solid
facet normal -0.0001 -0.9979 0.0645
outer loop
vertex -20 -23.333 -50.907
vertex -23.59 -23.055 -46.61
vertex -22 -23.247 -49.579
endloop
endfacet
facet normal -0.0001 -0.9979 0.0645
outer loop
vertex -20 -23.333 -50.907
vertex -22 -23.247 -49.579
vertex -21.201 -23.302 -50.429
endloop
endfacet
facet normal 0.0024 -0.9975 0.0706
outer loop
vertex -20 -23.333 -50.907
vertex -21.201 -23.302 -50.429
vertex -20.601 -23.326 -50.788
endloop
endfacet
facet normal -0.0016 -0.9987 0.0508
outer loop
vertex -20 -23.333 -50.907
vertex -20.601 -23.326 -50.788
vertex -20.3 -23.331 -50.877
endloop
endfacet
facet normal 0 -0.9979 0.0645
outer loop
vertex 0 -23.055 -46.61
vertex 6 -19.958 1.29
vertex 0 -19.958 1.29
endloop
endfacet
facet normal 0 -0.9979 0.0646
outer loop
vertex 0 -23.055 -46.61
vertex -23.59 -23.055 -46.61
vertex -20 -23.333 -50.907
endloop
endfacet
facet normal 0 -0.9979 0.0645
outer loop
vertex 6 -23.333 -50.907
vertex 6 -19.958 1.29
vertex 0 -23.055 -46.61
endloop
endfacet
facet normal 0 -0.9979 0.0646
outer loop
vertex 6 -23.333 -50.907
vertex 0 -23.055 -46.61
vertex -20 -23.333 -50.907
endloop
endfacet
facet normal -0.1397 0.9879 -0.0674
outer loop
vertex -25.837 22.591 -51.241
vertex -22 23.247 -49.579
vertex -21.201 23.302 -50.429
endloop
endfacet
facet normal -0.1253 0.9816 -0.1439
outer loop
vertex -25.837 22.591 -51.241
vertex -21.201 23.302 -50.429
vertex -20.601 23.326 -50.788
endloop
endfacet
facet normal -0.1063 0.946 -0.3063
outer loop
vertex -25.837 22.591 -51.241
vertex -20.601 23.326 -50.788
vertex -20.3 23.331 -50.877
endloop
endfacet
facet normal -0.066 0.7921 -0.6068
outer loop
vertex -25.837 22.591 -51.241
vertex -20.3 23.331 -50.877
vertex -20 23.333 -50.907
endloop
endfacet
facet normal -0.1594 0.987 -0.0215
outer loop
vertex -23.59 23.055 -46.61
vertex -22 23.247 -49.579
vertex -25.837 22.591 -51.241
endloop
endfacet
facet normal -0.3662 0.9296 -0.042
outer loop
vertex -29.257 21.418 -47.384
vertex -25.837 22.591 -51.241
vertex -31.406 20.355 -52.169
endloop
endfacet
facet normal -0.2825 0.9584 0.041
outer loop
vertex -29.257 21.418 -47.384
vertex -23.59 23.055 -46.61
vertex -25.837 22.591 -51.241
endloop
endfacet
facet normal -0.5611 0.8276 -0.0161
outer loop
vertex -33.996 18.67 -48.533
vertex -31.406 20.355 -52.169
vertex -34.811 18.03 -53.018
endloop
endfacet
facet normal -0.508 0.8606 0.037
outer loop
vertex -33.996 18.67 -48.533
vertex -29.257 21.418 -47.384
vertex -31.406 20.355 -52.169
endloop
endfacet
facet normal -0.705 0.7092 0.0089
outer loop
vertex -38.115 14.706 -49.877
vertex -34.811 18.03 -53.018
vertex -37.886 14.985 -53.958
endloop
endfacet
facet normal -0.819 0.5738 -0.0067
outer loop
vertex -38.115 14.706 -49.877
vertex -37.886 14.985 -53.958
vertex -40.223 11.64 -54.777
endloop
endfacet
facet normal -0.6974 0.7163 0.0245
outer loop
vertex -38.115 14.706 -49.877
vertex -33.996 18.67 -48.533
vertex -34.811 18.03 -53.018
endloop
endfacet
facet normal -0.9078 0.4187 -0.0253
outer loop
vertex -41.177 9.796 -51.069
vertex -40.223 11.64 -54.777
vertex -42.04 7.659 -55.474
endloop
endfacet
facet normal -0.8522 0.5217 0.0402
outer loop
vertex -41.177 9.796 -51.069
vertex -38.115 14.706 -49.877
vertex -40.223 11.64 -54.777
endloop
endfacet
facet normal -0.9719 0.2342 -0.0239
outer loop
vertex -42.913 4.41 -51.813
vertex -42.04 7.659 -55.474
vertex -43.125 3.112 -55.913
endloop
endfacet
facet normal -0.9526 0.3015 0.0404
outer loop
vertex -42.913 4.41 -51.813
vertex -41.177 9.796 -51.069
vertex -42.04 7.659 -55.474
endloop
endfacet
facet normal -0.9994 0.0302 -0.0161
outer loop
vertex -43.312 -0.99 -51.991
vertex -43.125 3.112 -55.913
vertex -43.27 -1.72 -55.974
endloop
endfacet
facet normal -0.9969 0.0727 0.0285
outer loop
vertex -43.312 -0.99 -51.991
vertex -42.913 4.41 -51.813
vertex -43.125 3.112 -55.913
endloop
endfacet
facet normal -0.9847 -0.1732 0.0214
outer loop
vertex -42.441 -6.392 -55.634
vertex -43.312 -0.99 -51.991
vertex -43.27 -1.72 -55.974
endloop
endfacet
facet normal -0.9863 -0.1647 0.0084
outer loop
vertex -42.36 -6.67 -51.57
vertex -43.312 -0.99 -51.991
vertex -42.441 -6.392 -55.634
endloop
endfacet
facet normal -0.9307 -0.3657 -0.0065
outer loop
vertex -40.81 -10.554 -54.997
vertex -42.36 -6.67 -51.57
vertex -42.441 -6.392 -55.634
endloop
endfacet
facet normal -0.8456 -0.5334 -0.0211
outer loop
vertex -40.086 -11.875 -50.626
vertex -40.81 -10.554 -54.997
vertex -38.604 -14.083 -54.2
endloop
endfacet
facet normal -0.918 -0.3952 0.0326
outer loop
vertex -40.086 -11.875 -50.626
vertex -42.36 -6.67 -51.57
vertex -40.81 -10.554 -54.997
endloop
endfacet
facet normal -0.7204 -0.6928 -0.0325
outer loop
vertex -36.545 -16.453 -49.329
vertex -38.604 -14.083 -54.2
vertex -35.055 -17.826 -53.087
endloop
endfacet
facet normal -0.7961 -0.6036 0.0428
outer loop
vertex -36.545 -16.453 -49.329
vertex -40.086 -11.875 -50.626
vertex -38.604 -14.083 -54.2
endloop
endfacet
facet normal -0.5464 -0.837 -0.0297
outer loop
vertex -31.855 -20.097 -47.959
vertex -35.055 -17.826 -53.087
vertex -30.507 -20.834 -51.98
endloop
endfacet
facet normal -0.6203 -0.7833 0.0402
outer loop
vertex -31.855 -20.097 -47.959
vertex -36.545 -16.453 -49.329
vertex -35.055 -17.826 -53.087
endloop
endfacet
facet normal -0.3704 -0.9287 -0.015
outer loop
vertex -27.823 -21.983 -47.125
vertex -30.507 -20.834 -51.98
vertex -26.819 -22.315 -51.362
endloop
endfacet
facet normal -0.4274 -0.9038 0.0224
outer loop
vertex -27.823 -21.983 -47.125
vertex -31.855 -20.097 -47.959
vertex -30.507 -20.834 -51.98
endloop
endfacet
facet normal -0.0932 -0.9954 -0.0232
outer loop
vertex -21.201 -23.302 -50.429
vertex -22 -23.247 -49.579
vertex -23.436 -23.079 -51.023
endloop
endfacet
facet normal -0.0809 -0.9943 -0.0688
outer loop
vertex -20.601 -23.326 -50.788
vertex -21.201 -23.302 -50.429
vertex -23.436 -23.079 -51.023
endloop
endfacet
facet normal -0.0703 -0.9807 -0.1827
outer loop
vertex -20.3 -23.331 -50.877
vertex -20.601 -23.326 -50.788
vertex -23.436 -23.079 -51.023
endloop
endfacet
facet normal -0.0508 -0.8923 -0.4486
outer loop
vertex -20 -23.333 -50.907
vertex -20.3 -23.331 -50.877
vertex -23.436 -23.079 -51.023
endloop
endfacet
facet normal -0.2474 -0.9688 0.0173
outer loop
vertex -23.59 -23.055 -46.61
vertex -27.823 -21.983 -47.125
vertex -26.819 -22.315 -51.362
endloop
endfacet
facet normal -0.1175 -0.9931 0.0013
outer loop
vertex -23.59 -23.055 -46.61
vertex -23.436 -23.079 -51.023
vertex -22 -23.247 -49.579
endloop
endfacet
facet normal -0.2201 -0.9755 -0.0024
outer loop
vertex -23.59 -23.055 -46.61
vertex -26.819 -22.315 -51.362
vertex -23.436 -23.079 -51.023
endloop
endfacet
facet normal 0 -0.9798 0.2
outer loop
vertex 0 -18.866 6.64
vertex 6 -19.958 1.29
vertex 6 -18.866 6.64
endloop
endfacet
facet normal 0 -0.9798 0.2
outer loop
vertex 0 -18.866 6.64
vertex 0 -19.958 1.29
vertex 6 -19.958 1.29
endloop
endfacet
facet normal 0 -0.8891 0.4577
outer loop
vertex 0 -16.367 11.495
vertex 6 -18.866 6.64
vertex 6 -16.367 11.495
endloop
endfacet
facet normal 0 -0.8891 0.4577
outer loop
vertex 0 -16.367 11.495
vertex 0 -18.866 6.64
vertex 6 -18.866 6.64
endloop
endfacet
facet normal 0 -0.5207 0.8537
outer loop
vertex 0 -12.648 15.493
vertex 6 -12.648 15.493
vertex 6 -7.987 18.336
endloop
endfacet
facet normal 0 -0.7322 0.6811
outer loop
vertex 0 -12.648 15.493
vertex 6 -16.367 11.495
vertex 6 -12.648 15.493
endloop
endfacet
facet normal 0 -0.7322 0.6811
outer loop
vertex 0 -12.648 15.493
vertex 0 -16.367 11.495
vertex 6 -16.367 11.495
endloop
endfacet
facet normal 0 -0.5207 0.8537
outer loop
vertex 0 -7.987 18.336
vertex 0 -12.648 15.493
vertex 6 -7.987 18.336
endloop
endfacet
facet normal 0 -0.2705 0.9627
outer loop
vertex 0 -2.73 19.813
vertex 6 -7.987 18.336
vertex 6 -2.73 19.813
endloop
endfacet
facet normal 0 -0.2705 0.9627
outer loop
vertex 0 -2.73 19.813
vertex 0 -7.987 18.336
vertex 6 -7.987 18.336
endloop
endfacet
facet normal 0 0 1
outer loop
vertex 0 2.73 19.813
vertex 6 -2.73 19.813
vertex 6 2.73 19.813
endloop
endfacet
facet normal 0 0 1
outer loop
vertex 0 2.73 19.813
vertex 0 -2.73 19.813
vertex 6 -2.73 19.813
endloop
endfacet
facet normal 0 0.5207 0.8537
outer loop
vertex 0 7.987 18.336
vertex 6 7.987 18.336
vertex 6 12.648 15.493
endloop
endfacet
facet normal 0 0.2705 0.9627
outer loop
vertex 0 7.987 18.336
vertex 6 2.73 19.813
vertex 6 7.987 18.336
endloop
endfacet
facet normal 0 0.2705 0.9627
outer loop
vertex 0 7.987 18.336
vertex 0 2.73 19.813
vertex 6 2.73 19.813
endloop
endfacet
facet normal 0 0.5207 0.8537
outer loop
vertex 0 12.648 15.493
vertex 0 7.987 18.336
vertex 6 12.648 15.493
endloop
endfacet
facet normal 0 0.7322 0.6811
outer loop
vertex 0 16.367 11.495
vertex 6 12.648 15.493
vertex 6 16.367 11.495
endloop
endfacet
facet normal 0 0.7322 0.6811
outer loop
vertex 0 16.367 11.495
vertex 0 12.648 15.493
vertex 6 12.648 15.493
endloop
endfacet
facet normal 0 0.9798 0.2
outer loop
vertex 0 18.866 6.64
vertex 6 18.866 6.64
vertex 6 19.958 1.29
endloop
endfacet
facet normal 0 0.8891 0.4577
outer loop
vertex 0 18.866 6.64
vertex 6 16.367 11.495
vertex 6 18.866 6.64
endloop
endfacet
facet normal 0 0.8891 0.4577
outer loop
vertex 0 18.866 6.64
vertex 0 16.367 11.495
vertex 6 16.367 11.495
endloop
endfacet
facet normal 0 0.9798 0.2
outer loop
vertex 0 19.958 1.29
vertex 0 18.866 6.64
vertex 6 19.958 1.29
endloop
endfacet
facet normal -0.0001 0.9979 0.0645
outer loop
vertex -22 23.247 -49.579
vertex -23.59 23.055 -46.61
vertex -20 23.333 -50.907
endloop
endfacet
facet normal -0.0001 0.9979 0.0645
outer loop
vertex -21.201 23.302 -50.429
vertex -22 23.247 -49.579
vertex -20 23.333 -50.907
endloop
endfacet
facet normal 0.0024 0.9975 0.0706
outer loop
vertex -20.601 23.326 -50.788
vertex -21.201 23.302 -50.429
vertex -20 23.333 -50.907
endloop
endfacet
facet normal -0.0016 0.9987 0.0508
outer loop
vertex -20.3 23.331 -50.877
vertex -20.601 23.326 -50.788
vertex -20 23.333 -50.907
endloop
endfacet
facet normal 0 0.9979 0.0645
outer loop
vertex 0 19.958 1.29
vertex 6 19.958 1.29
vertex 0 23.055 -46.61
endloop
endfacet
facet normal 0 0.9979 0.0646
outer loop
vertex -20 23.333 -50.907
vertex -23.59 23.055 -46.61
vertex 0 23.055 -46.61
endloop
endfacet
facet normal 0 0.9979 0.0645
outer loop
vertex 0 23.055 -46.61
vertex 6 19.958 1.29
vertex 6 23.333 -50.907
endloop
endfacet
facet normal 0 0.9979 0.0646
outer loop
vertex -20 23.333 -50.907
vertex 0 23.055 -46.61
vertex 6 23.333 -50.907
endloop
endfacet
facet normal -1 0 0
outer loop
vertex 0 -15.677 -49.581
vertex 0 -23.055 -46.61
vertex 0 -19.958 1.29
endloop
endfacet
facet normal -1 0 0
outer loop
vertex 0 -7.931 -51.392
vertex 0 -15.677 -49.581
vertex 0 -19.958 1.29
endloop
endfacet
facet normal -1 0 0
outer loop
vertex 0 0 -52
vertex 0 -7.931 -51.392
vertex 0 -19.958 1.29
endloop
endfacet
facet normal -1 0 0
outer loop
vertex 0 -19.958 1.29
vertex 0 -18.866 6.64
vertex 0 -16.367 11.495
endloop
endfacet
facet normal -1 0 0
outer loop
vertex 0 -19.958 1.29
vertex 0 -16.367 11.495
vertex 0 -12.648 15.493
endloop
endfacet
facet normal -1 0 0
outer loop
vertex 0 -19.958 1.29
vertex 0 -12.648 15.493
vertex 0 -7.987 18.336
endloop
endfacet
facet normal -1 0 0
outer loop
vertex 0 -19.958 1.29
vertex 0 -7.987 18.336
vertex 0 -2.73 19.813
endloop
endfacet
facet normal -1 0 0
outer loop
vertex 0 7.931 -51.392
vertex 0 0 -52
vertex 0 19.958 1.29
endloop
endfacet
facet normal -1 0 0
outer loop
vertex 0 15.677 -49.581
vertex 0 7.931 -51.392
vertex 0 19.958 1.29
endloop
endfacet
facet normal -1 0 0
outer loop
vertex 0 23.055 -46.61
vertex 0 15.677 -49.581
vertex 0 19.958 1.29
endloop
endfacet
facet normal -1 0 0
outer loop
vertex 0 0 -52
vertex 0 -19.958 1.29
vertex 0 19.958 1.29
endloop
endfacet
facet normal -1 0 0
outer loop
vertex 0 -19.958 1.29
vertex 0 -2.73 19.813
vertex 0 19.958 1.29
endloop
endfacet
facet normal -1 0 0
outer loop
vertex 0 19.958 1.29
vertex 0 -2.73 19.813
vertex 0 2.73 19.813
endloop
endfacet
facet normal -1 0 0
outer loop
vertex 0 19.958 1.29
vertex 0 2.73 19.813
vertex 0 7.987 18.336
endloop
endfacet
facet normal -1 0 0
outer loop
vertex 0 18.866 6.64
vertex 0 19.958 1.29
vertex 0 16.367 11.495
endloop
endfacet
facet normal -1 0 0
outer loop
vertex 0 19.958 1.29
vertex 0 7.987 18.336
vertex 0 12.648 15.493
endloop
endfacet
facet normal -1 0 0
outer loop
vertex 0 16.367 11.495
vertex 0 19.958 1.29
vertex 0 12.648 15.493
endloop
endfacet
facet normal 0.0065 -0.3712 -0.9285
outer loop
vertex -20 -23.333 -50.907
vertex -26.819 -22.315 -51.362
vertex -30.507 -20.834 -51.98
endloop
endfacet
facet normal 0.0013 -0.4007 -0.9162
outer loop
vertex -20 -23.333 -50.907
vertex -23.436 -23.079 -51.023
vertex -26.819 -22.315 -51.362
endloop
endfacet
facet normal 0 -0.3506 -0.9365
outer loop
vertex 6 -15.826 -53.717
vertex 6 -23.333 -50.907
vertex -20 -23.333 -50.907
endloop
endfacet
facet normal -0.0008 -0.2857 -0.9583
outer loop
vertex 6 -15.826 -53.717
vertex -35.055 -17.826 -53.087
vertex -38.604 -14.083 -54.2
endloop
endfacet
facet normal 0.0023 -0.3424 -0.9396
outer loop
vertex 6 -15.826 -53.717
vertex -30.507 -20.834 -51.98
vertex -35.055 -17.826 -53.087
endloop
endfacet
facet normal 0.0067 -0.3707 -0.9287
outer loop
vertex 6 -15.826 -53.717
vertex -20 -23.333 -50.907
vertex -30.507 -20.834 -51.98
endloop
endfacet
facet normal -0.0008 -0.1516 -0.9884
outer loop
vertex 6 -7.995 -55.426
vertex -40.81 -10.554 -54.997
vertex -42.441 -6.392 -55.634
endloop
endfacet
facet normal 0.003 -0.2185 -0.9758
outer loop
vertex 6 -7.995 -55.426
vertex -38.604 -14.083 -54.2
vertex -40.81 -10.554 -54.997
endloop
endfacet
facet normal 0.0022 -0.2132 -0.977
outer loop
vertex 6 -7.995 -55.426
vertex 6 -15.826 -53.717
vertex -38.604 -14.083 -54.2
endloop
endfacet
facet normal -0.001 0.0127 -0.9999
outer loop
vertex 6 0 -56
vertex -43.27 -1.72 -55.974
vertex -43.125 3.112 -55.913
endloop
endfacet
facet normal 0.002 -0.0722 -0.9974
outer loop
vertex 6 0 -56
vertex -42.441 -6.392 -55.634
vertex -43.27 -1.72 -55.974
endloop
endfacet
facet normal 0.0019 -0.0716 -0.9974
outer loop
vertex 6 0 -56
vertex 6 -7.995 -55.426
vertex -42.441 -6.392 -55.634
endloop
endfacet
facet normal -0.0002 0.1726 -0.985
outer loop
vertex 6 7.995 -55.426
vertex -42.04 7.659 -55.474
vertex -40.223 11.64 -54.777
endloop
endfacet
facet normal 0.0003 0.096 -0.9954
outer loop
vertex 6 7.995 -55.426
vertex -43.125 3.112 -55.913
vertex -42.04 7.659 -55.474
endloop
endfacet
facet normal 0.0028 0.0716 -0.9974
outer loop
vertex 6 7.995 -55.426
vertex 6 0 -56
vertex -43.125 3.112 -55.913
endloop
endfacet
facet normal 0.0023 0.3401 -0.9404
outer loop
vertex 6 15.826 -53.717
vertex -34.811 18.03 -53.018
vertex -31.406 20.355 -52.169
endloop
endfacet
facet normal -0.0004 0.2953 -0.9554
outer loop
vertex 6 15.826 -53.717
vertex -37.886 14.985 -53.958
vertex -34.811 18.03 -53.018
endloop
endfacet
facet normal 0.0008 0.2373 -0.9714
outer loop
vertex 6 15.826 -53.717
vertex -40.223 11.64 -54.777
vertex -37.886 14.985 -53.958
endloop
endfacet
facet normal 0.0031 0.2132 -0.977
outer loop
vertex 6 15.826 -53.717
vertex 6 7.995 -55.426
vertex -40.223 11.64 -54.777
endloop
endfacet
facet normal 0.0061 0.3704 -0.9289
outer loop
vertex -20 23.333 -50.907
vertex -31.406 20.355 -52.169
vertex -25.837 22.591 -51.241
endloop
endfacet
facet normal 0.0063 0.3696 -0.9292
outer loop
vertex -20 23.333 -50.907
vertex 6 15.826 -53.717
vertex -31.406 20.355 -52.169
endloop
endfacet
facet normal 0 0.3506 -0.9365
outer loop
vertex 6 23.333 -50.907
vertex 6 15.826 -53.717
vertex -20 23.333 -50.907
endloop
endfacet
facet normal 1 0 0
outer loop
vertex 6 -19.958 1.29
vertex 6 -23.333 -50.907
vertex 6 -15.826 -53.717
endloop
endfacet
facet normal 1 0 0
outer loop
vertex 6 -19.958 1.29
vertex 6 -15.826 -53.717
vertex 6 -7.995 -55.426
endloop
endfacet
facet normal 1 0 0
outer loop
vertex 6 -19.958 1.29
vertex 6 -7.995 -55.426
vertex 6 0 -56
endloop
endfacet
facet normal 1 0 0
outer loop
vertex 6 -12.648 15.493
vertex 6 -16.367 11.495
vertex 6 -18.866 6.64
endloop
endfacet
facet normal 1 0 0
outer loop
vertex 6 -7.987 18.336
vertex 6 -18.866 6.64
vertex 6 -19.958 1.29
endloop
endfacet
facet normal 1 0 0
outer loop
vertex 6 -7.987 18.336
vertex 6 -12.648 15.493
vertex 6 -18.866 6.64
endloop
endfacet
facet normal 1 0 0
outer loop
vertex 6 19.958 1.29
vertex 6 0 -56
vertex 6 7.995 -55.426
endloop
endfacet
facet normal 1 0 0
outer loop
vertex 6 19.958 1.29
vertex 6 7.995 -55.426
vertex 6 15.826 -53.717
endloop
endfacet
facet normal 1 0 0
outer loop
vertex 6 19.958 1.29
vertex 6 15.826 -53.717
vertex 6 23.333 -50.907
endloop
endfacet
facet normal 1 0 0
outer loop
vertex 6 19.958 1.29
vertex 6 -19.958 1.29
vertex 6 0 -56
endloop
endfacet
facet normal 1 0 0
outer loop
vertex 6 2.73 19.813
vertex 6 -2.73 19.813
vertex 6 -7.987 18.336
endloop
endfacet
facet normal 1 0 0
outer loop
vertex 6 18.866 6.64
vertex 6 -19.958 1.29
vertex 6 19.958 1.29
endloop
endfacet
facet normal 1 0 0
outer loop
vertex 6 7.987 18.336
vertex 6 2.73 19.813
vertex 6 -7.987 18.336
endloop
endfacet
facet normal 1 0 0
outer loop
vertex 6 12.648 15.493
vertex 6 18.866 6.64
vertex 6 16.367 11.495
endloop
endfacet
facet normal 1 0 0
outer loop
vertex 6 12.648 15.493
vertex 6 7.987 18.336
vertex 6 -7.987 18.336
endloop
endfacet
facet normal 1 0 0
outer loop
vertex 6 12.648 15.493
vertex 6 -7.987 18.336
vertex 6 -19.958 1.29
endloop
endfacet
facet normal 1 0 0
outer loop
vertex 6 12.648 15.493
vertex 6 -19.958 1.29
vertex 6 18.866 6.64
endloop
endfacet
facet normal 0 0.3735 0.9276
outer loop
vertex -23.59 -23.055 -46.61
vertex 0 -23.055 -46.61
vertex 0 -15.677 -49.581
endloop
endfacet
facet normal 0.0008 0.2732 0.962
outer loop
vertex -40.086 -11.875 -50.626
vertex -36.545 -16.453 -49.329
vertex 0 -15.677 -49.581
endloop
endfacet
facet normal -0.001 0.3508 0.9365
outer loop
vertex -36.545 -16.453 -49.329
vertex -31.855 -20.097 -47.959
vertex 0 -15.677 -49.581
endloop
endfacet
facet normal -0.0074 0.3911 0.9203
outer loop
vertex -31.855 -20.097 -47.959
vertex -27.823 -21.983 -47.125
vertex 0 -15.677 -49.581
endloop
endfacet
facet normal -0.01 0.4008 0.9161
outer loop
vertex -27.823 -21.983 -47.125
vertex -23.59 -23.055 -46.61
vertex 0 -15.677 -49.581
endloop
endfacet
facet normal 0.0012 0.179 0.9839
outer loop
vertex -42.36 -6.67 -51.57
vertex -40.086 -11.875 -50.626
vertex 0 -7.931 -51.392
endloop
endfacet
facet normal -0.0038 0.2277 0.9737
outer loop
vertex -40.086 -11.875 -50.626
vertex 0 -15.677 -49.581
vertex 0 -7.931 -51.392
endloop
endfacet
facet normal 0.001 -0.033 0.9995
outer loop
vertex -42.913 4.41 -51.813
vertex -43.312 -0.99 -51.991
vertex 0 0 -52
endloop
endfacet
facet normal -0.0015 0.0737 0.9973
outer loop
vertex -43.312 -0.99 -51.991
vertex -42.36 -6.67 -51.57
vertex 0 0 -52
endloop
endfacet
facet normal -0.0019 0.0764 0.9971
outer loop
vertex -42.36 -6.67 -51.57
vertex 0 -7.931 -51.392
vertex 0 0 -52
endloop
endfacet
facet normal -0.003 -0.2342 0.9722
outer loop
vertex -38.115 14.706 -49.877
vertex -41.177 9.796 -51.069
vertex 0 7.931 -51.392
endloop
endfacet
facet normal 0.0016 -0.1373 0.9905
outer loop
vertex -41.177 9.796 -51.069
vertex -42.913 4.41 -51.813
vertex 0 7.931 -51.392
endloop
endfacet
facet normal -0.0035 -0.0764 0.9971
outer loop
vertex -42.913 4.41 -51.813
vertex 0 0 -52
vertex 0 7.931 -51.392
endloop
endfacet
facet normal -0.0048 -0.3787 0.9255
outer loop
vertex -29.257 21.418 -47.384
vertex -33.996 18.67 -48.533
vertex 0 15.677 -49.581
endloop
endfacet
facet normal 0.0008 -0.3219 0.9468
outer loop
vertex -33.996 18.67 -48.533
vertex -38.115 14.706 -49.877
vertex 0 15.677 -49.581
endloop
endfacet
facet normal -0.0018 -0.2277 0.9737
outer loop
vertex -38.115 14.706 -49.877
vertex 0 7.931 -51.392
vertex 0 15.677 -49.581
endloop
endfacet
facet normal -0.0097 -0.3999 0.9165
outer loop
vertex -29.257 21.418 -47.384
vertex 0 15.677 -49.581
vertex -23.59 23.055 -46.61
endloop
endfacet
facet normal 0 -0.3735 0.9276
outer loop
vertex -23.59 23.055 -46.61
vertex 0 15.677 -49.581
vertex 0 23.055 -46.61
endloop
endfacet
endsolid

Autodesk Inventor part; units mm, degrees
ref_plane "YZ Plane" through (0, 0, 0) normal (1, 0, 0) x (0, 1, 0)
ref_plane "XZ Plane" through (0, 0, 0) normal (0, 1, 0) x (-1, 0, 0)
ref_plane "XY Plane" through (0, 0, 0) normal (0, 0, 1) x (1, 0, 0)
sketch "Sketch1" plane through (0, 0, 0) normal (1, 0, 0) x (0, 1, 0)
  circle A0 centre (0, 0) radius 20
  line L0 (-19.9583, 1.2905) -> (-23.3333, -50.9073)
  line L1 (19.9583, 1.2905) -> (23.3333, -50.9073)
  line L2 (9.9593, -5.75) -> (0, 0) construction
  line L3 (0, -48.5721) -> (0, 22.5) construction
  arc A1 (-23.0554, -46.6095) -> (23.0554, -46.6095) centre (0, 0) ccw
  arc A2 (-23.3333, -50.9073) -> (23.3333, -50.9073) centre (0, 0) ccw
  line L4 (0, 0) -> (-23.3333, -50.9073) construction
  point P0 (0, 11.4686)
  point P1 (0, 11.4686)
  dimension "d0" = 40
  dimension "d8" = 104
  dimension "d9" = 112
  dimension "d10" = 24.624
extrude "Extrusion1" add sketch "Sketch1" along normal blind 6
extrude "Extrusion2" add sketch "Sketch1" against normal blind 47.5 from surface at 0 contours L1 A2 L0 A1
sketch "Sketch2" plane through (0, 0, 0) normal (0, 0, 1) x (1, 0, 0)
  line L0 (6, -19.9583) -> (6, 19.9583) construction
  line L1 (6, 0) -> (-47.5, 0) construction
  line L2 (-47.5, 23.3333) -> (-47.5, -23.3333) projected
  circle A0 centre (-20, 0) radius 23.3333
  line L3 (6, 23.3333) -> (-47.5, 23.3333) projected
  line L4 (-47.5, -23.3333) -> (6, -23.3333) projected
  line L5 (-20, 23.3333) -> (-20, -23.3333) construction
  point P0 (0, 0)
  dimension "d21" = 27.5
extrude "Extrusion3" cut sketch "Sketch2" against normal through all contours L3 A0 L4 L2
properties part number "shank_connector"
